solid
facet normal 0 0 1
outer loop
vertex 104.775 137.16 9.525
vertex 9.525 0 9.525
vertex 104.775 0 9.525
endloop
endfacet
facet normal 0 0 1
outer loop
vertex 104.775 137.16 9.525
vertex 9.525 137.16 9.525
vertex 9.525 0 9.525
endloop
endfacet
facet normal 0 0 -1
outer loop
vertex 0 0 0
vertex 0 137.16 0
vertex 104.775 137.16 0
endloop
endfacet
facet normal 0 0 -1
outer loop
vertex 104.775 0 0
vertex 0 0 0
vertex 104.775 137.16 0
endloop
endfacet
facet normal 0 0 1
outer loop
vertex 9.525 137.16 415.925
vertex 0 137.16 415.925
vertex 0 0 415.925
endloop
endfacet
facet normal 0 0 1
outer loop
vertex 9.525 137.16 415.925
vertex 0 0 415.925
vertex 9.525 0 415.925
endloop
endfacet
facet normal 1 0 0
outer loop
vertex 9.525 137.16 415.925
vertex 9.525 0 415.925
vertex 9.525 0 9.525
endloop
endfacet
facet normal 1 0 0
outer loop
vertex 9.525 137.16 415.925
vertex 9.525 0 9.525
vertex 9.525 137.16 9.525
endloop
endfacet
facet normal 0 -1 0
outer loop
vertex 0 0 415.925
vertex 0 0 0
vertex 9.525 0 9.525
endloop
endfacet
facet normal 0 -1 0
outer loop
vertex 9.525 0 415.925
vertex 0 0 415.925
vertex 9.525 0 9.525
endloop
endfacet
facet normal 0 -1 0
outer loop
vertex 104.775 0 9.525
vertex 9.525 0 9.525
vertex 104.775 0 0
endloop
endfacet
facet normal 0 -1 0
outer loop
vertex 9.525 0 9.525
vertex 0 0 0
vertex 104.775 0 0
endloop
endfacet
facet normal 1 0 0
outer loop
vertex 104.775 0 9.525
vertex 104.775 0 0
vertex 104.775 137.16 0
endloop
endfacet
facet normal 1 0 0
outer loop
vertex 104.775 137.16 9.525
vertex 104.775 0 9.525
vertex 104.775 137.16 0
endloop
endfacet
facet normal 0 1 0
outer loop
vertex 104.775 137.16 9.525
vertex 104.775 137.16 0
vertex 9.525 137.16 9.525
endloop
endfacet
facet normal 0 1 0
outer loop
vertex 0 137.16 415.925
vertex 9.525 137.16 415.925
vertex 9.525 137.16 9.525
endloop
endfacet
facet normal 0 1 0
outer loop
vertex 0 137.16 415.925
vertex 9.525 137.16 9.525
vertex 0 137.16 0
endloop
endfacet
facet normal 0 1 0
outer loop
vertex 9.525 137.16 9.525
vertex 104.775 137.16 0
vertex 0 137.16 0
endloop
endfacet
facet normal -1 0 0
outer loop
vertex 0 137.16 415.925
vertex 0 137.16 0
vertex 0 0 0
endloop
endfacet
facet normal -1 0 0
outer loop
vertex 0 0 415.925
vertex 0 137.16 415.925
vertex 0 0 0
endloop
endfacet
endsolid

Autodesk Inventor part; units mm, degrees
ref_plane "YZ Plane" through (0, 0, 0) normal (1, 0, 0) x (0, 1, 0)
ref_plane "XZ Plane" through (0, 0, 0) normal (0, 1, 0) x (-1, 0, 0)
ref_plane "XY Plane" through (0, 0, 0) normal (0, 0, 1) x (1, 0, 0)
sketch "Sketch1" plane through (0, 0, 0) normal (0, 0, 1) x (1, 0, 0)
  line L0 (0, 0) -> (104.775, 0)
  line L1 (104.775, 0) -> (104.775, 137.16)
  line L2 (104.775, 137.16) -> (0, 137.16)
  line L3 (0, 137.16) -> (0, 0)
  dimension "d0" = 104.775
  dimension "d1" = 137.16
extrude "Extrusion1" add sketch "Sketch1" along normal blind 9.525
sketch "Sketch2" plane through (0, 0, 9.525) normal (0, 0, 1) x (1, 0, 0)
  line L0 (0, 137.16) -> (104.775, 137.16) projected
  line L1 (0, 0) -> (9.525, 0)
  line L2 (9.525, 0) -> (9.525, 137.16)
  line L3 (9.525, 137.16) -> (0, 137.16)
  line L4 (0, 137.16) -> (0, 0)
  dimension "d4" = 9.525
extrude "Extrusion2" add sketch "Sketch2" along normal blind 406.4
properties part number "l_bracket" material "Aluminum-6061"
